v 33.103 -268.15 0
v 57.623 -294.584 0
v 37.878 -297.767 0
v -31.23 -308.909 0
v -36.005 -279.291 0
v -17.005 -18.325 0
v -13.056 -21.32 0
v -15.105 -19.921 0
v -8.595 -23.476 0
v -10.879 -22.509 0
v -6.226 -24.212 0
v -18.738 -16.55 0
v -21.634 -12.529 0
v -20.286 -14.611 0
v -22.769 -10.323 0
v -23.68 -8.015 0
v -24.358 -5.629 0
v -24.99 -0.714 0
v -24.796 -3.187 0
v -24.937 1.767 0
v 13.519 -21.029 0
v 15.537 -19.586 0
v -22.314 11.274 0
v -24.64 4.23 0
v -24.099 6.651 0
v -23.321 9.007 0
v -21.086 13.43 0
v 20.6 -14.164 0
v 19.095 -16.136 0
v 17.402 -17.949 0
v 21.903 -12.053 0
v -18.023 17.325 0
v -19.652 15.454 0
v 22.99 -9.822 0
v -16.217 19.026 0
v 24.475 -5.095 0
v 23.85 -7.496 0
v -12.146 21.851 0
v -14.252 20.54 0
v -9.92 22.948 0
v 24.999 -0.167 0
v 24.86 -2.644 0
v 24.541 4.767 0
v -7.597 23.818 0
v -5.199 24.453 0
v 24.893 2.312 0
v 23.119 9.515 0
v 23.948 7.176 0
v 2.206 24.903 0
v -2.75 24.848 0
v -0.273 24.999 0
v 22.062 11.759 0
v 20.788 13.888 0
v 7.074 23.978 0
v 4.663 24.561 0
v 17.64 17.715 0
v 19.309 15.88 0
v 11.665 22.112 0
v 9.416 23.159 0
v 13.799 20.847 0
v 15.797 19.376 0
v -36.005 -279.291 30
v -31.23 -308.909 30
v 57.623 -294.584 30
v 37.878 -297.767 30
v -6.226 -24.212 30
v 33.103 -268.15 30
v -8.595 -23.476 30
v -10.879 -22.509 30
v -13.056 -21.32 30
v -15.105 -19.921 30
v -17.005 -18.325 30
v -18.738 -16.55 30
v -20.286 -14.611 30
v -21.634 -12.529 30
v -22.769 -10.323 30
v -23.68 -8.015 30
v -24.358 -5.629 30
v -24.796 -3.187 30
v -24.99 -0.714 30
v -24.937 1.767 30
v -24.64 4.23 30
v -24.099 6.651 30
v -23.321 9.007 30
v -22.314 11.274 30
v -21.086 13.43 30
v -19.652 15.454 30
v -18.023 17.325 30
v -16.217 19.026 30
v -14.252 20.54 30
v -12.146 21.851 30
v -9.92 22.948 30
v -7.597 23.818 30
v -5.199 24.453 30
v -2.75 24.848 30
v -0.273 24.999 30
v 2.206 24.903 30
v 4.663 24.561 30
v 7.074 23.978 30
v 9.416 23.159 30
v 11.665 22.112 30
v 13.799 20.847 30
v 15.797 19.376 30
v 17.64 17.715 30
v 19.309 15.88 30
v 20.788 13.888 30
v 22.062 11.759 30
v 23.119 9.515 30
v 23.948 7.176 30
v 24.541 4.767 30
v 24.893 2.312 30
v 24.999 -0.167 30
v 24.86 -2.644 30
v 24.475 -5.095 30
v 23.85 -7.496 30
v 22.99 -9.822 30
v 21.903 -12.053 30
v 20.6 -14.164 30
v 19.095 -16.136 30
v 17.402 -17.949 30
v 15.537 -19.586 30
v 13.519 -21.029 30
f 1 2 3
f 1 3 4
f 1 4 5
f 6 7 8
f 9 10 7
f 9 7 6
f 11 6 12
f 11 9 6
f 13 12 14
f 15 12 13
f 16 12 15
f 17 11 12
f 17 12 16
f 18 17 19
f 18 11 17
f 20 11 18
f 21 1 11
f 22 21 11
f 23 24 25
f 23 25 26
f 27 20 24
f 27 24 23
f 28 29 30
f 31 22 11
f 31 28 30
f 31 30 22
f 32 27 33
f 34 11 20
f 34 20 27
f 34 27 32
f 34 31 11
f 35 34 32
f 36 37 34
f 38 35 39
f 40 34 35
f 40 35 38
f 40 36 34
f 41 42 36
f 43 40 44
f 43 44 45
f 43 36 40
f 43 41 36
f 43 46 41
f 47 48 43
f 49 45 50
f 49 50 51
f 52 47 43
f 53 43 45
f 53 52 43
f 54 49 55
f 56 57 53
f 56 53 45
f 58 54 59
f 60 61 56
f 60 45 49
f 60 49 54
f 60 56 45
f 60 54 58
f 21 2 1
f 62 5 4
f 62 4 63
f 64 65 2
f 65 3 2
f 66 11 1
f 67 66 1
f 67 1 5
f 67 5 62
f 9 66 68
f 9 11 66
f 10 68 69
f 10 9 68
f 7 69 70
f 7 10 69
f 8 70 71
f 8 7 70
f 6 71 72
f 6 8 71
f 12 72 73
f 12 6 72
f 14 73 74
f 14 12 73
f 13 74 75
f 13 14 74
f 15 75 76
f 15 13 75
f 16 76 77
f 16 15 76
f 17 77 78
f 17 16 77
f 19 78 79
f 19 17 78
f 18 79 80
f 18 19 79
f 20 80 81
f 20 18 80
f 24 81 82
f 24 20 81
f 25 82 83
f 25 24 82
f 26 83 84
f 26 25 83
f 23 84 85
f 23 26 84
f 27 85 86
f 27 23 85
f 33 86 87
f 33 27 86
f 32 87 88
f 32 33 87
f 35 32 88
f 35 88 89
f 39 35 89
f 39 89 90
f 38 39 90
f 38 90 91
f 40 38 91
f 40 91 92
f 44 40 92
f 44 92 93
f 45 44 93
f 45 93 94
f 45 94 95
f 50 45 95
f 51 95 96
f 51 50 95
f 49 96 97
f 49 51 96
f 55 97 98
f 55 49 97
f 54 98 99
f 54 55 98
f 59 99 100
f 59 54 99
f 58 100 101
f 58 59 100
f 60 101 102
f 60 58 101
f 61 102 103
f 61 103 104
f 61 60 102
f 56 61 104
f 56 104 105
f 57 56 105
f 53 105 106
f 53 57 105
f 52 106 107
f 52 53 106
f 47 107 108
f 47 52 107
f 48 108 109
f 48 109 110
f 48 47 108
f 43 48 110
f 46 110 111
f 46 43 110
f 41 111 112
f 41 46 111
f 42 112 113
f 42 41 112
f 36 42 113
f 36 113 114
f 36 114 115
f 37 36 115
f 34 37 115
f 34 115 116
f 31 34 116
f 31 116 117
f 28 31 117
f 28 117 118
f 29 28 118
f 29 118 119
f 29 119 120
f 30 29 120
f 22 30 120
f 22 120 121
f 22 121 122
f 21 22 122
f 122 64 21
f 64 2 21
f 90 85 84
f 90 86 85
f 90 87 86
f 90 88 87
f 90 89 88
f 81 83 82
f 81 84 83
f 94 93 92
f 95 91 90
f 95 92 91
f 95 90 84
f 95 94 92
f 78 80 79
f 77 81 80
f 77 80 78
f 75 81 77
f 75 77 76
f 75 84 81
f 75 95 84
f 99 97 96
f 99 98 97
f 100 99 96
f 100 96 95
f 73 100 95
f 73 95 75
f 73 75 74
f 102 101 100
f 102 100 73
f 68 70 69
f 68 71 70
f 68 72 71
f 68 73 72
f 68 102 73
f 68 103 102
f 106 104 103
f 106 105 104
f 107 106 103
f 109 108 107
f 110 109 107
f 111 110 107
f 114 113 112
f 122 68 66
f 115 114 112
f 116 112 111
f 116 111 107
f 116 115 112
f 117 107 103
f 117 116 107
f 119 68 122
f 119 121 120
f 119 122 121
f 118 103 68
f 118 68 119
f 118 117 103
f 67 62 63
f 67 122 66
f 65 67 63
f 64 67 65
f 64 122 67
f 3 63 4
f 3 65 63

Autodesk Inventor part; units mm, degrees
ref_plane "YZ Plane" through (0, 0, 0) normal (1, 0, 0) x (0, 1, 0)
ref_plane "XZ Plane" through (0, 0, 0) normal (0, 1, 0) x (-1, 0, 0)
ref_plane "XY Plane" through (0, 0, 0) normal (0, 0, 1) x (1, 0, 0)
sketch "Sketch1" plane through (0, 0, 0) normal (0, 0, 1) x (1, 0, 0)
  arc A0 (5.5018, -3.1706) -> (4.1426, 4.8126) centre (0, 0) ccw projected
  line L0 (-0.2789, 17.1872) -> (4.1426, 4.8126) projected
  arc A1 (-0.2789, 17.1872) -> (-5.4243, 16.3111) centre (-2.7743, 16.2955) ccw projected
  line L1 (-5.5018, 3.1706) -> (-5.4243, 16.3111) projected
  arc A2 (-5.5018, 3.1706) -> (-4.1426, -4.8126) centre (0, 0) ccw projected
  line L2 (-4.1426, -4.8126) -> (0.2789, -17.1872) projected
  arc A3 (0.2789, -17.1872) -> (5.4243, -16.3111) centre (2.7743, -16.2955) ccw projected
  line L3 (5.4243, -16.3111) -> (5.5018, -3.1706) projected
  circle A4 centre (1.7673, -10.3806) radius 0.5 projected
  circle A5 centre (1.2638, -7.4232) radius 0.5 projected
  circle A6 centre (0, 0) radius 4.375 projected
  circle A7 centre (-2.2708, 13.3381) radius 0.5 projected
  circle A8 centre (-1.7673, 10.3806) radius 0.5 projected
  circle A9 centre (-1.2638, 7.4232) radius 0.5 projected
  circle A10 centre (-2.7743, 16.2955) radius 0.5 projected
  circle A11 centre (2.2708, -13.3381) radius 0.5 projected
  circle A12 centre (2.7743, -16.2955) radius 0.5 projected
  line L4 (0, 0) -> (2.7743, -16.2955)
  line L5 (0, 0) -> (47.7501, -296.1755)
  line L6 (0, 0) -> (23.8751, -148.0877)
  line L7 (-9.8725, -1.5917) -> (37.8776, -297.7672)
  line L8 (37.8776, -297.7672) -> (57.6226, -294.5838)
  line L9 (57.6226, -294.5838) -> (9.8725, 1.5917)
  line L10 (9.8725, 1.5917) -> (-9.8725, -1.5917)
  line L11 (-9.8725, -1.5917) -> (57.6226, -294.5838) construction
  line L12 (37.8776, -297.7672) -> (9.8725, 1.5917) construction
  circle A13 centre (0, 0) radius 25
  point P0 (13.5195, -21.0291)
  point P1 (-6.2255, -24.2124)
  dimension "d0" = 300
  dimension "d1" = 150
  dimension "d2" = 20
  dimension "d3" = 50
extrude "Extrusion1" add sketch "Sketch1" along normal blind 30 contours L3 A3 L5 A12 L4 A11 A4 A5 A6 L10 A0 | A0 L10 L9 A13 L5 A3 L3 | L10 A6 A2 L1 A1 L0 A0 | A0 L0 A1 L1 A2 L10 L7 A13 L9 | L10 A6 | A6 L4 L10 | L5 A13 L7 L10 A2 L2 A3 | A3 L2 A2 L10 A6 L5 A5 A4 A11 A12 | L9 L8 L5 A13 | L10 L5 A6 | L4 A6 L5 | L5 A12 | A12 L5 | L5 L8 L7 A13 | L4 A5 L5 A6 | L5 A11 L4 A12 | L4 A5 L5 | A5 L4 | L5 A5 | L5 A11 L4 | A11 L5 | L4 A4 L5 A5 | L4 A11 | L5 A4 L4 A11 | L4 A4 L5 | A4 L4 | L5 A4 | A7 | A8 | A9 | A10
sketch "Sketch2" plane through (37.8776, -297.7672, 0) normal (-0.9872517, -0.159167, 0) x (0, 0, 1)
  line L0 (30, 277.0871) -> (30, 0) projected
  line L1 (30, 0) -> (0, 0)
  line L2 (0, 0) -> (0, 30)
  line L3 (0, 30) -> (30, 30)
  line L4 (30, 30) -> (30, 0)
  point P0 (0, 300)
  point P1 (30, 30)
  dimension "d6" = 30
  dimension "d7" = 30
extrude "Extrusion2" add sketch "Sketch2" along normal blind 70
properties part number "arm" material "PET Plastic"
